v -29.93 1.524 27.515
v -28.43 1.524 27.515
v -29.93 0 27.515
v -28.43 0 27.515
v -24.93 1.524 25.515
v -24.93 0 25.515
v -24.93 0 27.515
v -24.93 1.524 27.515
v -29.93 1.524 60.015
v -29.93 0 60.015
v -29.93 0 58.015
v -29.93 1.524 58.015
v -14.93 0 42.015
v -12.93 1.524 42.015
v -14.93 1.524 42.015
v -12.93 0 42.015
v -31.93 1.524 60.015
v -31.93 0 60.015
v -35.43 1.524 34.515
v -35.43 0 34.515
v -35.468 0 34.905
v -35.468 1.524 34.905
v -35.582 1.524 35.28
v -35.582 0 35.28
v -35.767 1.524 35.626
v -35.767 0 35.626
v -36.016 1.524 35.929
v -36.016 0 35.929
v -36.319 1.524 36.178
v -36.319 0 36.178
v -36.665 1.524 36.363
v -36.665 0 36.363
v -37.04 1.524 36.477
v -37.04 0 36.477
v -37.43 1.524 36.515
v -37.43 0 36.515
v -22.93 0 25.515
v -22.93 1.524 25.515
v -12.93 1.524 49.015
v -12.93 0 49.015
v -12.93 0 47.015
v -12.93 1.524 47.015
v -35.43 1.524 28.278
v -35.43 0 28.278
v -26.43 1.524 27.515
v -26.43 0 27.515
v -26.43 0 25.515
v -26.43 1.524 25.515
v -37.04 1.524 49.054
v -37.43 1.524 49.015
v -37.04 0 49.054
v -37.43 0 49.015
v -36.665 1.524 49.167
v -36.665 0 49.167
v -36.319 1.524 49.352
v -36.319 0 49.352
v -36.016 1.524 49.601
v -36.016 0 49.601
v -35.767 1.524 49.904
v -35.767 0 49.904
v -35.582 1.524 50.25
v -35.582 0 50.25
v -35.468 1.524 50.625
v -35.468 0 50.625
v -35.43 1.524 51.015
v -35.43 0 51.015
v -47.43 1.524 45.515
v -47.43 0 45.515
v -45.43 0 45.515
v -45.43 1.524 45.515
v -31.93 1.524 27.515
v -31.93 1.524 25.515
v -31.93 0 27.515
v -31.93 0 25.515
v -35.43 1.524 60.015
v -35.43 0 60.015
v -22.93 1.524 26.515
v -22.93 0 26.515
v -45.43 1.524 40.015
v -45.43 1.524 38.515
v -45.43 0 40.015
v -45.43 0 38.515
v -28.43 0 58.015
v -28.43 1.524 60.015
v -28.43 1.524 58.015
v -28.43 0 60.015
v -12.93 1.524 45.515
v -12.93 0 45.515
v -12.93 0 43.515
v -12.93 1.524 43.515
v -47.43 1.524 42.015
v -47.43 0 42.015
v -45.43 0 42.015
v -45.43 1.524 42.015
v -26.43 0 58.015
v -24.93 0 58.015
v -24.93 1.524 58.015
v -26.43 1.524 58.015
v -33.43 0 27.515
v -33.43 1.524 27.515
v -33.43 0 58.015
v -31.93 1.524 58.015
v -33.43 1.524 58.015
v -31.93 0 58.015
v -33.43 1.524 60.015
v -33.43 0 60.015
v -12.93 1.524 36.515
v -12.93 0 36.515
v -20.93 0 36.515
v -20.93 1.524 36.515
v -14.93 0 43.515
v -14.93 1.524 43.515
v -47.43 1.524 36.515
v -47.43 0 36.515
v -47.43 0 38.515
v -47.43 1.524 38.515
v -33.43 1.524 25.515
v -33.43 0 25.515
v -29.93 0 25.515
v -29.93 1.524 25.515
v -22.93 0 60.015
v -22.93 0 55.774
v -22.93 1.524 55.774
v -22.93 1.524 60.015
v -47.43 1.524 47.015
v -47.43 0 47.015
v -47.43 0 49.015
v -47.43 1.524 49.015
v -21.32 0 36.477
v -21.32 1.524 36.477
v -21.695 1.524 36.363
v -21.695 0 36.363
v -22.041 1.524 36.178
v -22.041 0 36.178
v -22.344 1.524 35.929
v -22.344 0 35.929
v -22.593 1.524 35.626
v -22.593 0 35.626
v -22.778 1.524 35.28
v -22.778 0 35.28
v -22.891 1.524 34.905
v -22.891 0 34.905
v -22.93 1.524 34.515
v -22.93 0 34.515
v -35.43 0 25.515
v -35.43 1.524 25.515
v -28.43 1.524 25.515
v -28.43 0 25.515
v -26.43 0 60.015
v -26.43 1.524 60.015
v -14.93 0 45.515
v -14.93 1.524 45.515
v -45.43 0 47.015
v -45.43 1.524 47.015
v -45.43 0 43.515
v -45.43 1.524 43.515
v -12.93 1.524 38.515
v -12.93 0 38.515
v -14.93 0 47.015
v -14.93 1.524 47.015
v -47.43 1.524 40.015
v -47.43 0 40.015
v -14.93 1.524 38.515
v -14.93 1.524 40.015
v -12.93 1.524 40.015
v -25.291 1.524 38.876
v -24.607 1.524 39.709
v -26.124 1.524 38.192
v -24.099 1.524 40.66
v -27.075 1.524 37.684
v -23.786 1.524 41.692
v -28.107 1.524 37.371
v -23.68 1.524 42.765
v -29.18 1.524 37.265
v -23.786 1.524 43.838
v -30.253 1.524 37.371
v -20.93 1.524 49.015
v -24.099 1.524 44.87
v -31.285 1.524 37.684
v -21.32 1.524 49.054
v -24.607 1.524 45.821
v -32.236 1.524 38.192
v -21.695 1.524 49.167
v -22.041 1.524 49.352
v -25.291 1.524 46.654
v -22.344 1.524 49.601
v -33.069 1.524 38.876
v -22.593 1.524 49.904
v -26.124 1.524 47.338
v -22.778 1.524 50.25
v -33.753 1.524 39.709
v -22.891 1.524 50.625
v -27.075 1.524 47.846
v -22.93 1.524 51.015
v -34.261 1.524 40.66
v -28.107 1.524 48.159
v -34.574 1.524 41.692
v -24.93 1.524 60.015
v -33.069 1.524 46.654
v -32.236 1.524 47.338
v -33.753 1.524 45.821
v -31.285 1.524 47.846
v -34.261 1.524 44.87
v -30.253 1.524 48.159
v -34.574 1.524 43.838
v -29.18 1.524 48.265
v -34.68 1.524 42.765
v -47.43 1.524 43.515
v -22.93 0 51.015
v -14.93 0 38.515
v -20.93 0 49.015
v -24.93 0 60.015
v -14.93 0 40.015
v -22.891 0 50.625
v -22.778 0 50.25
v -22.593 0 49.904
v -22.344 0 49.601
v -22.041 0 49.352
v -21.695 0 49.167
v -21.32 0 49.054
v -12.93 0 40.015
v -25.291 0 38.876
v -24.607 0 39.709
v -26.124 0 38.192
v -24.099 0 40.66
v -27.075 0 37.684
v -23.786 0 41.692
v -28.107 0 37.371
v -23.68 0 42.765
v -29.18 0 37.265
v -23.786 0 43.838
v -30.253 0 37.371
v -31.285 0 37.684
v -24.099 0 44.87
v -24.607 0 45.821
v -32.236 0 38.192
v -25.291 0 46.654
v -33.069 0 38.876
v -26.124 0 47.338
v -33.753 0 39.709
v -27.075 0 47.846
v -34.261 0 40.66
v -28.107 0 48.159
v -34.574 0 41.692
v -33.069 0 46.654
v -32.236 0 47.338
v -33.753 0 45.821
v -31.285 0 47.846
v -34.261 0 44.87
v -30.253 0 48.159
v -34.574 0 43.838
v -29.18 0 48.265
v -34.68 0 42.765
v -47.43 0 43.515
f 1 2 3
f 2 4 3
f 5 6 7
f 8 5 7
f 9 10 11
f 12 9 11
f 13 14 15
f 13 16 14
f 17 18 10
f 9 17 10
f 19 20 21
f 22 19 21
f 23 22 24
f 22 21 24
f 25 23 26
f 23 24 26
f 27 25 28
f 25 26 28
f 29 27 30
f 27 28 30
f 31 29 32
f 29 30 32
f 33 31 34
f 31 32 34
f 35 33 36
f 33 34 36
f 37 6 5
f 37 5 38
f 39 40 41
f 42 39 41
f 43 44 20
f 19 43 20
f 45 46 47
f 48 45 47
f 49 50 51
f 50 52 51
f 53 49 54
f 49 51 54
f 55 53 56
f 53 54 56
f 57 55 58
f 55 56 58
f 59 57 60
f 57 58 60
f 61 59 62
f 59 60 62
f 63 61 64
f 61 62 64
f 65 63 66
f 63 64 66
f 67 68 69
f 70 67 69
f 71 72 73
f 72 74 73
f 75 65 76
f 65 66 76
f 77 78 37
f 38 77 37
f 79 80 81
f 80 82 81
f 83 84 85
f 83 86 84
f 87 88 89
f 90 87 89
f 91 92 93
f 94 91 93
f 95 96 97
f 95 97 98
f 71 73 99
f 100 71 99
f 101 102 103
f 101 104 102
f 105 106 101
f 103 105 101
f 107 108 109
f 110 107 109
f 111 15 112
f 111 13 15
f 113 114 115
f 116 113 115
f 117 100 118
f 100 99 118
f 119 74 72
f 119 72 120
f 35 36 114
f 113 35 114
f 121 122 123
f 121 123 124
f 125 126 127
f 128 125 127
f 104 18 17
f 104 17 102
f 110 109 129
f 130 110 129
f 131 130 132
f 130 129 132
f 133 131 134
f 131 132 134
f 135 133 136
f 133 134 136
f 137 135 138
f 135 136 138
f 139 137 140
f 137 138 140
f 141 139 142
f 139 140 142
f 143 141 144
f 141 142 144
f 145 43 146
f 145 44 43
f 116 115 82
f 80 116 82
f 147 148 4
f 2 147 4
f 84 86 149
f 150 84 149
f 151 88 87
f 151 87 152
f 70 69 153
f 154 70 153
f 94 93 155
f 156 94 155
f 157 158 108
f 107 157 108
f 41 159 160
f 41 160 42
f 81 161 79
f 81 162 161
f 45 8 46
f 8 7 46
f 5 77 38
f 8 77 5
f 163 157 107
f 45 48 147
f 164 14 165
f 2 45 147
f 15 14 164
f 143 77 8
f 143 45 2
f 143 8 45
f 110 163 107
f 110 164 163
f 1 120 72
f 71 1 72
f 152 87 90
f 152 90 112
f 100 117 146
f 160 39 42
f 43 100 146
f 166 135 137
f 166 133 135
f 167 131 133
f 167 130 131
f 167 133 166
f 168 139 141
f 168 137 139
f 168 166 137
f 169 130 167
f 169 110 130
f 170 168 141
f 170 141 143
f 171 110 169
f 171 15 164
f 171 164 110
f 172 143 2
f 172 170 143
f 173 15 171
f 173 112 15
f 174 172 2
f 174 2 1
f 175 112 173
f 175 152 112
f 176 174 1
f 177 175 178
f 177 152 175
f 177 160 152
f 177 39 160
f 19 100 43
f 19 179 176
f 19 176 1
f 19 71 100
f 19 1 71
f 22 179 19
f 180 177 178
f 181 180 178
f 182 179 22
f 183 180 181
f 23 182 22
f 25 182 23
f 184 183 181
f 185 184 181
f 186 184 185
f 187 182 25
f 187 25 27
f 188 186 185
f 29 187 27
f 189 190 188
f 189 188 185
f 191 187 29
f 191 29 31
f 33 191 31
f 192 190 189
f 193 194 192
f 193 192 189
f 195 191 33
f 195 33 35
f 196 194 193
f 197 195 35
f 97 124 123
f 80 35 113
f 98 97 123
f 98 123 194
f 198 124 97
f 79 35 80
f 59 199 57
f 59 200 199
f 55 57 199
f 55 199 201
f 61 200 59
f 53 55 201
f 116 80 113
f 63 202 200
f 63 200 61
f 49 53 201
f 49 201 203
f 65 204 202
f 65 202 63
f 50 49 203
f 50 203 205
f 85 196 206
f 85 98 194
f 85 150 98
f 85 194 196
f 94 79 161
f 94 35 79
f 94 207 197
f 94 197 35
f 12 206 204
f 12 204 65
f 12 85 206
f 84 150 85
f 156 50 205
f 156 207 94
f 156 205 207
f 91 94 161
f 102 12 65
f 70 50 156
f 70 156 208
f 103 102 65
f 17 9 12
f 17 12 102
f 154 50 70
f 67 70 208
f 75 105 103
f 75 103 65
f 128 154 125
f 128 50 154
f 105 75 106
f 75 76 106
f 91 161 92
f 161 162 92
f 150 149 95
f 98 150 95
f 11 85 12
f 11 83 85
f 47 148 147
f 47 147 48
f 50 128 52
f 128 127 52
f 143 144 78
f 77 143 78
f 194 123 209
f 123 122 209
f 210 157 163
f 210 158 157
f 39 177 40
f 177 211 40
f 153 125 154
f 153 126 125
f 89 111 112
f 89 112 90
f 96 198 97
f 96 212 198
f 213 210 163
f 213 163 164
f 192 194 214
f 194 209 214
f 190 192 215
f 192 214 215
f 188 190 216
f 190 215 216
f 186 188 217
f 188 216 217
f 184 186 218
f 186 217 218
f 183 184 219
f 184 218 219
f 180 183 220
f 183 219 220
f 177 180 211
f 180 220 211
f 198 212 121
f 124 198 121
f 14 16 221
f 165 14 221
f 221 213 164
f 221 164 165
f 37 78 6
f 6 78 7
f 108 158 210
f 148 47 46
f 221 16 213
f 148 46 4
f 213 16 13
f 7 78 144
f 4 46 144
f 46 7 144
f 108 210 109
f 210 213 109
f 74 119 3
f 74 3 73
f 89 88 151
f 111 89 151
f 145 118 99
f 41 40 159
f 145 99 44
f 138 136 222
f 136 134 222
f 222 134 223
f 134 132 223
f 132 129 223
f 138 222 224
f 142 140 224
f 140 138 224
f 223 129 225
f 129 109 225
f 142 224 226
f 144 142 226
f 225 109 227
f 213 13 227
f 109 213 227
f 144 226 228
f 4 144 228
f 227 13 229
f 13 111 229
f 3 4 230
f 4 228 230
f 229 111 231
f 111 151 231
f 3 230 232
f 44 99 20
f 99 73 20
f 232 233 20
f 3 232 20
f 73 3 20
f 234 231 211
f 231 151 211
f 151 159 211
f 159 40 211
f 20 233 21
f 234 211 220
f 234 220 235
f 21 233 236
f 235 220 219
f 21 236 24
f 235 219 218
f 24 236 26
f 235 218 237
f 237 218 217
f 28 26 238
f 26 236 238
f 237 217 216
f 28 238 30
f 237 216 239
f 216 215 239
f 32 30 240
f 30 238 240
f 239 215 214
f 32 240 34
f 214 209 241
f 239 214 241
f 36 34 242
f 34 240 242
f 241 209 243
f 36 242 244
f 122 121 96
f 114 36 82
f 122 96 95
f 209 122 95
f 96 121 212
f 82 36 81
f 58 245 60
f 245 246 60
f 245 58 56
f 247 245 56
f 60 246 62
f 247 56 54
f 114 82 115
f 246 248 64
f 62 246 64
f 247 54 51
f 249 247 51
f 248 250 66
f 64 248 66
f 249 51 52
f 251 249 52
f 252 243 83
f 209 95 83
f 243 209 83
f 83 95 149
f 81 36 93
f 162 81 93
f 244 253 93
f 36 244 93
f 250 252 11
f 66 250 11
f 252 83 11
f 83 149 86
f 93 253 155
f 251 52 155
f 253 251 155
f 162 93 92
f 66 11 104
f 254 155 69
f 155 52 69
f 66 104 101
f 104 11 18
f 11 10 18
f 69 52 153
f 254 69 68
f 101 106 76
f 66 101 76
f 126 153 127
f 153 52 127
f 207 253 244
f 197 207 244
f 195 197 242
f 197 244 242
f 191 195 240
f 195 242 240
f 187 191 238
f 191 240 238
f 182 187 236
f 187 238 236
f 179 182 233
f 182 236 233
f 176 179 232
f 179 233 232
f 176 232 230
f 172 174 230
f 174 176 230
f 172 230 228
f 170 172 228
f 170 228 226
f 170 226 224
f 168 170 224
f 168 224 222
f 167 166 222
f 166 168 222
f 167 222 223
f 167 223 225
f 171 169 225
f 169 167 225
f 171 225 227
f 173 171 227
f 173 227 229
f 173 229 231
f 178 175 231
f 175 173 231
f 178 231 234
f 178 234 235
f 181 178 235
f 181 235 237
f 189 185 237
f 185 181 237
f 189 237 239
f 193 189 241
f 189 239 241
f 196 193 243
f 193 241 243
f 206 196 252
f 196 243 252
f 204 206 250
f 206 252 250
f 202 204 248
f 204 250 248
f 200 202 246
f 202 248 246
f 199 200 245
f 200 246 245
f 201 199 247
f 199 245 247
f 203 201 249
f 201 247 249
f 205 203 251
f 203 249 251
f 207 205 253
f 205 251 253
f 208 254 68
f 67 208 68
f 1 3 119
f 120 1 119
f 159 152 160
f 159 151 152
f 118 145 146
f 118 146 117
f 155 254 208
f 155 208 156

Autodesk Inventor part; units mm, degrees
ref_plane "YZ Plane" through (0, 0, 0) normal (1, 0, 0) x (0, 1, 0)
ref_plane "XZ Plane" through (0, 0, 0) normal (0, 1, 0) x (-1, 0, 0)
ref_plane "XY Plane" through (0, 0, 0) normal (0, 0, 1) x (1, 0, 0)
sketch "Sketch2" plane through (0, 0, 0) normal (0, 1, 0) x (-1, 0, 0)
  line L0 (35.4299, 28.2779) -> (35.4299, 34.5151)
  line L1 (35.4299, 51.0151) -> (35.4299, 60.0151)
  line L2 (47.4299, 49.0151) -> (37.4299, 49.0151)
  line L3 (20.9299, 49.0151) -> (12.9299, 49.0151)
  line L4 (22.9299, 55.7744) -> (22.9299, 51.0151)
  line L5 (22.9299, 34.5151) -> (22.9299, 26.5151)
  line L6 (12.9299, 36.5151) -> (20.9299, 36.5151)
  line L7 (37.4299, 36.5151) -> (47.4299, 36.5151)
  line L8 (12.9299, 38.5151) -> (14.9299, 38.5151)
  line L9 (14.9299, 38.5151) -> (14.9299, 40.0151)
  line L10 (14.9299, 40.0151) -> (12.9299, 40.0151)
  line L11 (12.9299, 42.0151) -> (14.9299, 42.0151)
  line L12 (14.9299, 42.0151) -> (14.9299, 43.5151)
  line L13 (14.9299, 43.5151) -> (12.9299, 43.5151)
  line L14 (12.9299, 45.5151) -> (14.9299, 45.5151)
  line L15 (14.9299, 45.5151) -> (14.9299, 47.0151)
  line L16 (14.9299, 47.0151) -> (12.9299, 47.0151)
  line L17 (12.9299, 49.0151) -> (12.9299, 47.0151)
  line L18 (12.9299, 45.5151) -> (12.9299, 43.5151)
  line L19 (12.9299, 42.0151) -> (12.9299, 40.0151)
  line L20 (12.9299, 38.5151) -> (12.9299, 36.5151)
  line L21 (33.4299, 27.5151) -> (33.4299, 25.5151)
  line L22 (31.9299, 25.5151) -> (31.9299, 27.5151)
  line L23 (29.9299, 27.5151) -> (29.9299, 25.5151)
  line L24 (28.4299, 25.5151) -> (28.4299, 27.5151)
  line L25 (26.4299, 27.5151) -> (26.4299, 25.5151)
  line L26 (24.9299, 25.5151) -> (24.9299, 27.5151)
  line L27 (47.4299, 47.0151) -> (45.4299, 47.0151)
  line L28 (47.4299, 45.5151) -> (45.4299, 45.5151)
  line L29 (47.4299, 43.5151) -> (45.4299, 43.5151)
  line L30 (47.4299, 42.0151) -> (45.4299, 42.0151)
  line L31 (47.4299, 40.0151) -> (45.4299, 40.0151)
  line L32 (47.4299, 38.5151) -> (45.4299, 38.5151)
  line L33 (45.4299, 38.5151) -> (45.4299, 40.0151)
  line L34 (45.4299, 42.0151) -> (45.4299, 43.5151)
  line L35 (45.4299, 45.5151) -> (45.4299, 47.0151)
  line L36 (47.4299, 36.5151) -> (47.4299, 38.5151)
  line L37 (47.4299, 40.0151) -> (47.4299, 42.0151)
  line L38 (47.4299, 43.5151) -> (47.4299, 45.5151)
  line L39 (47.4299, 47.0151) -> (47.4299, 49.0151)
  line L40 (33.4299, 60.0151) -> (33.4299, 58.0151)
  line L41 (31.9299, 60.0151) -> (31.9299, 58.0151)
  line L42 (29.9299, 60.0151) -> (29.9299, 58.0151)
  line L43 (28.4299, 60.0151) -> (28.4299, 58.0151)
  line L44 (26.4299, 60.0151) -> (26.4299, 58.0151)
  line L45 (24.9299, 60.0151) -> (24.9299, 58.0151)
  arc A0 (35.4299, 51.0151) -> (37.4299, 49.0151) centre (37.4299, 51.0151) ccw
  arc A1 (37.4299, 36.5151) -> (35.4299, 34.5151) centre (37.4299, 34.5151) ccw
  arc A2 (22.9299, 34.5151) -> (20.9299, 36.5151) centre (20.9299, 34.5151) ccw
  arc A3 (20.9299, 49.0151) -> (22.9299, 51.0151) centre (20.9299, 51.0151) ccw
  line L46 (35.4299, 28.2779) -> (35.4299, 25.5151)
  line L47 (22.9299, 26.5151) -> (22.9299, 25.5151)
  line L48 (35.4299, 25.5151) -> (33.4299, 25.5151)
  line L49 (31.9299, 25.5151) -> (29.9299, 25.5151)
  line L50 (28.4299, 25.5151) -> (26.4299, 25.5151)
  line L51 (24.9299, 25.5151) -> (22.9299, 25.5151)
  line L52 (24.9299, 27.5151) -> (26.4299, 27.5151)
  line L53 (28.4299, 27.5151) -> (29.9299, 27.5151)
  line L54 (31.9299, 27.5151) -> (33.4299, 27.5151)
  line L55 (22.9299, 55.7744) -> (22.9299, 60.0151)
  line L56 (35.4299, 60.0151) -> (33.4299, 60.0151)
  line L57 (31.9299, 60.0151) -> (29.9299, 60.0151)
  line L58 (28.4299, 60.0151) -> (26.4299, 60.0151)
  line L59 (24.9299, 60.0151) -> (22.9299, 60.0151)
  line L60 (24.9299, 58.0151) -> (26.4299, 58.0151)
  line L61 (28.4299, 58.0151) -> (29.9299, 58.0151)
  line L62 (31.9299, 58.0151) -> (33.4299, 58.0151)
  circle A4 centre (29.1799, 42.7651) radius 5.5
  point P0 (0, 0)
  point P1 (35.4299, 36.5151)
  point P2 (35.4299, 49.0151)
  point P3 (22.9299, 49.0151)
  point P4 (22.9299, 36.5151)
  dimension "d25" = 1.5
  dimension "d26" = 1.5
  dimension "d27" = 1.5
  dimension "d28" = 2
  dimension "d29" = 2
  dimension "d30" = 2
  dimension "d31" = 2
  dimension "d43" = 2
  dimension "d44" = 2
  dimension "d45" = 2
  dimension "d46" = 2
  dimension "d47" = 2
  dimension "d48" = 2
  dimension "d49" = 2
  dimension "d50" = 2
  dimension "d51" = 2
  dimension "d52" = 2
  dimension "d53" = 2
  dimension "d60" = 2
  dimension "d61" = 1.5
  dimension "d62" = 1.5
  dimension "d63" = 1.5
  dimension "d64" = 1.5
  dimension "d65" = 1.5
  dimension "d66" = 1.5
  dimension "d67" = 1.5
  dimension "d68" = 1.5
  dimension "d69" = 1.5
  dimension "d70" = 2
  dimension "d71" = 2
  dimension "d72" = 2
  dimension "d74" = 2
  dimension "d75" = 2
  dimension "d76" = 2
  dimension "d77" = 2
  dimension "d78" = 2
  dimension "d79" = 2
  dimension "d80" = 2
  dimension "d81" = 11
  dimension "d82" = 11
  dimension "d83" = 11
  dimension "d84" = 11
  dimension "d85" = 2
  dimension "d86" = 2
  dimension "d87" = 2
  dimension "d88" = 2
  dimension "d89" = 10
  dimension "d90" = 10
  dimension "d91" = 12
  dimension "d92" = 12
  dimension "d97" = 2
  dimension "d98" = 2
  dimension "d99" = 2
  dimension "d100" = 8
  dimension "d102" = 2
  dimension "d105" = 6.25
  dimension "d106" = 6.25
  dimension "d109" = 2
  dimension "d110" = 0
  dimension "d111" = 2
  dimension "d112" = 0
  dimension "d113" = 2
extrude "Extrusion3" add sketch "Sketch2" along normal blind 1.524
properties part number "cross"
